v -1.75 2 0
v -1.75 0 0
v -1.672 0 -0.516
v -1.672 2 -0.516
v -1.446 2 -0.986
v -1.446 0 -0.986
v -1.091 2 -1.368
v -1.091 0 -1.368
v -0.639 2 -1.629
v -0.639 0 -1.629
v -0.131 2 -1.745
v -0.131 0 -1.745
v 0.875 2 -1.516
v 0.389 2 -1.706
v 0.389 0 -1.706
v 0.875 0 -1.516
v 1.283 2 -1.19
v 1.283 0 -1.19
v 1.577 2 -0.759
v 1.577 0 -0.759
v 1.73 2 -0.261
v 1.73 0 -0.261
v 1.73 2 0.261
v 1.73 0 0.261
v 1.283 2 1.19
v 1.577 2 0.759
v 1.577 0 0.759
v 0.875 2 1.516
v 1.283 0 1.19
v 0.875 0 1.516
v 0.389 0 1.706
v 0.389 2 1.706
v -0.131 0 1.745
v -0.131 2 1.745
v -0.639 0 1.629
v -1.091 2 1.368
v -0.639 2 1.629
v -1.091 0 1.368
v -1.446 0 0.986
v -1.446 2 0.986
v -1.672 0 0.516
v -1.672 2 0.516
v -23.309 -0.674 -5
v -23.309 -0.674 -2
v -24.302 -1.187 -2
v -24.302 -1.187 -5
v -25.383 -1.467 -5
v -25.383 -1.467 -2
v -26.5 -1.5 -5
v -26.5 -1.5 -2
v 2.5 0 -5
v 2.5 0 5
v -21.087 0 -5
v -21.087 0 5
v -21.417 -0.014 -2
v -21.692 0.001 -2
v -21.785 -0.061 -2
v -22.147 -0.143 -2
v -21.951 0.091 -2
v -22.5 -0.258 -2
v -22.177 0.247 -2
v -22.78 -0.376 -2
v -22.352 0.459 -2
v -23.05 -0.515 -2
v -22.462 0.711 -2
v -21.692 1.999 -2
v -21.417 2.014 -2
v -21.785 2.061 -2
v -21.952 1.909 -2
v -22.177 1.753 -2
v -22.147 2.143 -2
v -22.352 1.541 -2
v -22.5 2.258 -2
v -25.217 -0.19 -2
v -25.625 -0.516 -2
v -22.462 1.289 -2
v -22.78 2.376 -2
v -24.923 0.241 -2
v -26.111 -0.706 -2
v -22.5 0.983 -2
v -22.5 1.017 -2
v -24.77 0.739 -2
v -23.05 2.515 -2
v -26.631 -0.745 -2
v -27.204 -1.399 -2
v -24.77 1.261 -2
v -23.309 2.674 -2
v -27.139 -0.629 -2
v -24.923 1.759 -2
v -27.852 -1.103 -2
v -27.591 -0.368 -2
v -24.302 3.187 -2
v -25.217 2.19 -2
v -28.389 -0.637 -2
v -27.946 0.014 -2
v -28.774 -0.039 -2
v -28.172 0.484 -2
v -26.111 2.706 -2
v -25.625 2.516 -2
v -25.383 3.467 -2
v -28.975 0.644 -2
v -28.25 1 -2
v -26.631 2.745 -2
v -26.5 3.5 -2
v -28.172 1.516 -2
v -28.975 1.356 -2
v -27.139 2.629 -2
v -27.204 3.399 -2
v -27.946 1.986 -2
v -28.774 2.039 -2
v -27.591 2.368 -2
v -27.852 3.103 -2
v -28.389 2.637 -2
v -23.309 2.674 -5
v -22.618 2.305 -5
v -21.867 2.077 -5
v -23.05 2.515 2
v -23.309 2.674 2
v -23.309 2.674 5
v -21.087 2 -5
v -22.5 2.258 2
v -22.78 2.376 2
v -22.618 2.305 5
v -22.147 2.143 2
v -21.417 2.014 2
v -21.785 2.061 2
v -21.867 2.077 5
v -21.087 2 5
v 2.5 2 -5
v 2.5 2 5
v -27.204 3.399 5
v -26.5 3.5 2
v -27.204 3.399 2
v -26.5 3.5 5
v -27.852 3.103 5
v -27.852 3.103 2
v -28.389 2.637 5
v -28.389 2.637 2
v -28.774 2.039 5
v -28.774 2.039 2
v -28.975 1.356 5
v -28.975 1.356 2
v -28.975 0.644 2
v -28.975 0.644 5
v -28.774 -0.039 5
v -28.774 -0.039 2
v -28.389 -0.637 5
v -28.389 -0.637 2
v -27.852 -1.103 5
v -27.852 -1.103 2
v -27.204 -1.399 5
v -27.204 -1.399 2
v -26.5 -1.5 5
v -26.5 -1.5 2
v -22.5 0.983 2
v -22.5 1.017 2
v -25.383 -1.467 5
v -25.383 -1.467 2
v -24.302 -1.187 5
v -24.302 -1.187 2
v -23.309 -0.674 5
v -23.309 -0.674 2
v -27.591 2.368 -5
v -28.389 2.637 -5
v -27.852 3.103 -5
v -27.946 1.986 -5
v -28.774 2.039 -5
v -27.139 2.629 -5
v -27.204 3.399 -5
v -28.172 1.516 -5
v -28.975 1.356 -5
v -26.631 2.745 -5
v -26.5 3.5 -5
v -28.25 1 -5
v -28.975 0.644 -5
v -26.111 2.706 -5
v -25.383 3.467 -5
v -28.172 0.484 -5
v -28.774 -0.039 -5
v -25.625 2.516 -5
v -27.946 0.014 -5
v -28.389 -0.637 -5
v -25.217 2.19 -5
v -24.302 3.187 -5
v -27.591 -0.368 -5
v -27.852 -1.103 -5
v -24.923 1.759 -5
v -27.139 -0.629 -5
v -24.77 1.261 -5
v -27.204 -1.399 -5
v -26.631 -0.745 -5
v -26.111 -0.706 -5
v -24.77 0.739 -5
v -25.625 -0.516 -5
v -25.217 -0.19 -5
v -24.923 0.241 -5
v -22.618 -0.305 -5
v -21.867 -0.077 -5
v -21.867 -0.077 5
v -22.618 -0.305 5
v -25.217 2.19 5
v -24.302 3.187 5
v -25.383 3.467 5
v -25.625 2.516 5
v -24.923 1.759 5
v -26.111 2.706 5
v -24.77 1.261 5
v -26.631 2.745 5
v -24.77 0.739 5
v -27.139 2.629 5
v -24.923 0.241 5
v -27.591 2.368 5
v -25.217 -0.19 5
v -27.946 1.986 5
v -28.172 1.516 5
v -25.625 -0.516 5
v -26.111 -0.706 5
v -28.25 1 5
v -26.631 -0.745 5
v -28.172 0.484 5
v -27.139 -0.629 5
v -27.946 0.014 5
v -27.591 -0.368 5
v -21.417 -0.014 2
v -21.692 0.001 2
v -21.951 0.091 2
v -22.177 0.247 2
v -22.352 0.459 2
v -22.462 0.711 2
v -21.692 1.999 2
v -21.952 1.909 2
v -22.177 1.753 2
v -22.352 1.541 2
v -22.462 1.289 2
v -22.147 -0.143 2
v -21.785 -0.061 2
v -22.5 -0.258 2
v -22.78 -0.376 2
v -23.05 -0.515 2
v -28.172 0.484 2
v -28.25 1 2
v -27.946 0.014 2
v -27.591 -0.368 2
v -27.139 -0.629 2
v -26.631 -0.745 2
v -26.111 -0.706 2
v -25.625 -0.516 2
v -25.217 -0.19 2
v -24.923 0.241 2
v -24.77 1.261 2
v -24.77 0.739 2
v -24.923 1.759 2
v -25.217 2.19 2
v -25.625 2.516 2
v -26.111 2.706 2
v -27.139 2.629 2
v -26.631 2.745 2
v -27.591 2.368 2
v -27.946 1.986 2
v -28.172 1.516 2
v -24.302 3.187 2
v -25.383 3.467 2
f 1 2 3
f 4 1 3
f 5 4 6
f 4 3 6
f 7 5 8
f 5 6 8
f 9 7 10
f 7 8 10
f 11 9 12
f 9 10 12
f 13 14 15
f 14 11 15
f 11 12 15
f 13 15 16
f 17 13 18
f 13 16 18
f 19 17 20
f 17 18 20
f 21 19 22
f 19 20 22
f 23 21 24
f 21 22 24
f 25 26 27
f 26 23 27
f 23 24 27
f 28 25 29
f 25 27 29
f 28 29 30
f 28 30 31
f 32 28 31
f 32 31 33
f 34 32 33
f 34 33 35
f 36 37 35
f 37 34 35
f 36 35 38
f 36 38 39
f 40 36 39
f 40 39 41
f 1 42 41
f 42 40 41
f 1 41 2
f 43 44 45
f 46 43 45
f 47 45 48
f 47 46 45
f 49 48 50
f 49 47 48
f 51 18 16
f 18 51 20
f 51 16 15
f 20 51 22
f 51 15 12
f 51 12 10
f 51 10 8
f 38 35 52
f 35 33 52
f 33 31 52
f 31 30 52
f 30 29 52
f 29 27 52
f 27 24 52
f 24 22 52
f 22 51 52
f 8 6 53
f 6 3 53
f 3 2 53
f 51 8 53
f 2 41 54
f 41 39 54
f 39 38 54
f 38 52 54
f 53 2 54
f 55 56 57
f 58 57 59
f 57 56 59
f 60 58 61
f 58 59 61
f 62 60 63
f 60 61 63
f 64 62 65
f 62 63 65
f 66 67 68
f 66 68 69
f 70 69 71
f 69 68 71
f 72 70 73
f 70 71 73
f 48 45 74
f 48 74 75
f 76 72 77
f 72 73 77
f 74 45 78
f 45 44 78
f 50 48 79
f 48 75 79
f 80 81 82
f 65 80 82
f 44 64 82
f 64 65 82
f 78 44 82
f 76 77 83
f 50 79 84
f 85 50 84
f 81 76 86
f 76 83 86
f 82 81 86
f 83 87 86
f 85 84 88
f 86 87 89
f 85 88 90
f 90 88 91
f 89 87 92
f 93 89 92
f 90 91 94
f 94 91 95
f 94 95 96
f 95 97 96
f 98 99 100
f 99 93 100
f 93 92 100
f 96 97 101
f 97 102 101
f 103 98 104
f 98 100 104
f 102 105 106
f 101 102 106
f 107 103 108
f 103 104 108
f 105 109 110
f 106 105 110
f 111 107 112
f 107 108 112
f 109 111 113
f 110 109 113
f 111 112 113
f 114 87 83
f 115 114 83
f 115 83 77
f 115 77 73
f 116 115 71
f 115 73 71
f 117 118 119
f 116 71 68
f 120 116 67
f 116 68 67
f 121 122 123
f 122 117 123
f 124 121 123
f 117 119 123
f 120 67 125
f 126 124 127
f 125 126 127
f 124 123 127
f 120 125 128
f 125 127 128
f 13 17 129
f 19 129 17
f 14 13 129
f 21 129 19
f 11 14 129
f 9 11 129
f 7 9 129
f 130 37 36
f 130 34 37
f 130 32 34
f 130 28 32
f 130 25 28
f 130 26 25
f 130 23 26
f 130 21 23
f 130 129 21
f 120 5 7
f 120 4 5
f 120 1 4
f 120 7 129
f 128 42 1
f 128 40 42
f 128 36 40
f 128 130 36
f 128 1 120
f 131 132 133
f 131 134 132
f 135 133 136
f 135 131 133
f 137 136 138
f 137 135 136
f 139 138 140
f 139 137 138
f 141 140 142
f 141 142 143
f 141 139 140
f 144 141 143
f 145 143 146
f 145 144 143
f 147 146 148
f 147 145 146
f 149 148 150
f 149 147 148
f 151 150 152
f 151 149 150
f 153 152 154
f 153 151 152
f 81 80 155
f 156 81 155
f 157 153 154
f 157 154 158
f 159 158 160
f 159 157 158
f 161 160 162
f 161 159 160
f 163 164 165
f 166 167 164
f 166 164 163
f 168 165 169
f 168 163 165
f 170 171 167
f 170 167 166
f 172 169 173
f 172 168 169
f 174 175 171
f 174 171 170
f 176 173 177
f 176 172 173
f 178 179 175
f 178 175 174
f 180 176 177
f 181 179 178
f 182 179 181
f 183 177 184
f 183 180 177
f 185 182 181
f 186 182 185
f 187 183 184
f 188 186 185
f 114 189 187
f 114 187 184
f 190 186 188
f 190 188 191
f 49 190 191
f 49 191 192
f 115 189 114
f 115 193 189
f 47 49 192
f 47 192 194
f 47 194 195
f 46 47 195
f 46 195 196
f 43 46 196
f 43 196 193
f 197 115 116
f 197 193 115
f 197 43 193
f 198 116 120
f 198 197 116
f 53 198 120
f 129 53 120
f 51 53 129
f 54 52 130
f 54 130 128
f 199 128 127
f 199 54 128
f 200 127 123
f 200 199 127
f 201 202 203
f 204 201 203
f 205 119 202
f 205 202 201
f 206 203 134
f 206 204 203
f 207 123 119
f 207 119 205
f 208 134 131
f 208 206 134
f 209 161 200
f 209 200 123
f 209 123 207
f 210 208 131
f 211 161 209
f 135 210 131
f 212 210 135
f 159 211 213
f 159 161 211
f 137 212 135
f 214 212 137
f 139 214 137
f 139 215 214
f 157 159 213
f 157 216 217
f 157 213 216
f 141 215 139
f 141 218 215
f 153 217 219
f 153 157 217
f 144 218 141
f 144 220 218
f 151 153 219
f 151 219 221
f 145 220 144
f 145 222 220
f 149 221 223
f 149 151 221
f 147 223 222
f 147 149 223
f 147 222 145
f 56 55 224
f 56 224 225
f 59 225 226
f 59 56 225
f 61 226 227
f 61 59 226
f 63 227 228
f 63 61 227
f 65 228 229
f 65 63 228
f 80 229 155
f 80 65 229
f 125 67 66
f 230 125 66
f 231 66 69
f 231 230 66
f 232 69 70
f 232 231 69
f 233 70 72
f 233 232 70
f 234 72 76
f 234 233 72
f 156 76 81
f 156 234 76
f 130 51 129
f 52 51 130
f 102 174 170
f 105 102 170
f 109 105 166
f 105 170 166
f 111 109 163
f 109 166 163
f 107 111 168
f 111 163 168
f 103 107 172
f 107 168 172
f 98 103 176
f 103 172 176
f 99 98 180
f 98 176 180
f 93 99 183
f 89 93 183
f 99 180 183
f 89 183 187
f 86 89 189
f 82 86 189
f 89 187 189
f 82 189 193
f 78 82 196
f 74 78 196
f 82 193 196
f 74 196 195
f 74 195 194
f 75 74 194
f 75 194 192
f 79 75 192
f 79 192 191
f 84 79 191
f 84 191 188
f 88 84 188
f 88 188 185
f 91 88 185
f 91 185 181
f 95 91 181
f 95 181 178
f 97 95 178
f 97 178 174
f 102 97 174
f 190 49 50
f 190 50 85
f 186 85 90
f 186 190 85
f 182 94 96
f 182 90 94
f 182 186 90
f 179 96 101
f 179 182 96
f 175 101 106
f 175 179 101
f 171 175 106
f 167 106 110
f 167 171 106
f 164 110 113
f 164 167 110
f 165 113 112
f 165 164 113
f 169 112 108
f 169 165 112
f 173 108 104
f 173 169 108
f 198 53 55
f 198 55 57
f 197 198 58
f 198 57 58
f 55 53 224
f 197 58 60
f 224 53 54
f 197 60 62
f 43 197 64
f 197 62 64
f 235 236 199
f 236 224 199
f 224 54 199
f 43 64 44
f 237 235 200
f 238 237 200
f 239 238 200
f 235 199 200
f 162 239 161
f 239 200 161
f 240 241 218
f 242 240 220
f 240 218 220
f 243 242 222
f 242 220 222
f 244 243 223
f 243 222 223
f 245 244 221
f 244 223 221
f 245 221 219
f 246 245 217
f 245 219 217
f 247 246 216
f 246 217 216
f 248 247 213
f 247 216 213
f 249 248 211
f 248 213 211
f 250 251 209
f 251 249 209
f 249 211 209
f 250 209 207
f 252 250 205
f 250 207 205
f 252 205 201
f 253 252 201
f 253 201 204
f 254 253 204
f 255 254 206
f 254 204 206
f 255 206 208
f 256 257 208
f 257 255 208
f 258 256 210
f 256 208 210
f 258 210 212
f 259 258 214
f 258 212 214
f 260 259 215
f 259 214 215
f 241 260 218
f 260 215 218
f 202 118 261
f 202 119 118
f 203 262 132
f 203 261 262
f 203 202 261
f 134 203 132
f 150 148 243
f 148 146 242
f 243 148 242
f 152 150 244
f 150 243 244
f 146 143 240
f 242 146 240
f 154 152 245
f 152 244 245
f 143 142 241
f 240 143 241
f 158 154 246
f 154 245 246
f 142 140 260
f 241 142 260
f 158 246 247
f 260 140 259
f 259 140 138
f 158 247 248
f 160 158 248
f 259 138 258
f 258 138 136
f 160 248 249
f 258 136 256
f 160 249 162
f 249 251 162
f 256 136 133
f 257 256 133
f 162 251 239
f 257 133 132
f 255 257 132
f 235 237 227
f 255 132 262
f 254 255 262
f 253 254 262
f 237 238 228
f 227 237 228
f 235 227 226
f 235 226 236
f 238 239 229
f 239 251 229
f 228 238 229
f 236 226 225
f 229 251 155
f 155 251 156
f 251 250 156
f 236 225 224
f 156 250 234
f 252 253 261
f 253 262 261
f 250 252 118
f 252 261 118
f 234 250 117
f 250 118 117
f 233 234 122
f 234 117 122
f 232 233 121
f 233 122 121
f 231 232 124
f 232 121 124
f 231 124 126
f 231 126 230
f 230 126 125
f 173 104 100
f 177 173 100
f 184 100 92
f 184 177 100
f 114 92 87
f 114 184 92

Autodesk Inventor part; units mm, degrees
ref_plane "YZ Plane" through (0, 0, 0) normal (1, 0, 0) x (0, 1, 0)
ref_plane "XZ Plane" through (0, 0, 0) normal (0, 1, 0) x (-1, 0, 0)
sketch "Szkic1" plane through (0, 0, 0) normal (0, 1, 0) x (-1, 0, 0)
  line L0 (-2.5, 5) -> (2.5, 5)
  line L1 (2.5, 5) -> (2.5, -5)
  line L2 (2.5, -5) -> (-2.5, -5)
  line L3 (-2.5, -5) -> (-2.5, 5)
  line L4 (-2.5, 5) -> (2.5, -5) construction
  line L5 (2.5, 5) -> (-2.5, -5) construction
  circle A0 centre (0, 0) radius 1.75
  line L6 (2.5, 5) -> (22.5, 5)
  line L7 (22.5, 5) -> (22.5, -5)
  line L8 (22.5, -5) -> (2.5, -5)
  line L9 (2.5, -5) -> (2.5, 5)
  line L10 (-2.5, 0) -> (-30.5, 0)
  line L11 (-30.5, 0) -> (-30.5, -9)
  line L12 (-30.5, -9) -> (-2.5, -9)
  line L13 (-2.5, -9) -> (-2.5, 0)
  line L14 (-30.5, 0) -> (-30.5, 9)
  line L15 (-30.5, 9) -> (-2.5, 9)
  line L16 (-2.5, 9) -> (-2.5, 0)
  dimension "d0" = 5
  dimension "d1" = 10
  dimension "d2" = 3.5
  dimension "d3" = 20
  dimension "d4" = 10
  dimension "d23" = 28
  dimension "d24" = 9
extrude "Wyciągnięcie proste1" add sketch "Szkic1" along normal blind 2 contours L0 L1 L2 L3 | L6 L7 L8 L1
sketch "Szkic2" plane through (2.5, 0, -5) normal (0, 0, -1) x (-1, 0, 0)
  line L0 (25, 0) -> (25, 2) projected
  line L1 (25, 1) -> (29, 1)
  line L2 (25, 1) -> (29, 1) construction
  circle A0 centre (29, 1) radius 1.75
  circle A1 centre (29, 1) radius 2.5
  line L3 (29, 3.5) -> (29, 3.5)
  line L4 (29, -1.5) -> (29, -1.5)
  arc A2 (29, 3.5) -> (25, 2) centre (28.5874, -1.4829) ccw
  arc A3 (25, 0) -> (29, -1.5) centre (28.5874, 3.4829) ccw
  point P0 (2.5, 0)
  point P1 (29, 3.5)
  point P2 (29, -1.5)
  dimension "d10" = 4
  dimension "d11" = 0
  dimension "d12" = 3.5
  dimension "d13" = 5
  dimension "d14" = 0
  dimension "d15" = 0
  dimension "d16" = 5
  dimension "d17" = 5
extrude "Wyciągnięcie proste2" add sketch "Szkic2" against normal blind 3
ref_plane "Płaszczyzna konstrukcyjna1" through (2.5, 0, 0) normal (0, 0, -1) x (-1, 0, 0)
mirror "Odbij1" about plane through (2.5, 0, 0) normal (0, 0, -1) of "Wyciągnięcie proste2"
fillet "Zaokrąglenie1" radius 4 4 edges at (-22.5, 2, -3.5) (-22.5, 2, 3.5) (-22.5, 0, -3.5) (-22.5, 0, 3.5)
fillet "Zaokrąglenie2" radius 1 2 edges at (-22.5, 2.258, 0) (-22.5, -0.258, 0)
properties part number "lamp_p1"
